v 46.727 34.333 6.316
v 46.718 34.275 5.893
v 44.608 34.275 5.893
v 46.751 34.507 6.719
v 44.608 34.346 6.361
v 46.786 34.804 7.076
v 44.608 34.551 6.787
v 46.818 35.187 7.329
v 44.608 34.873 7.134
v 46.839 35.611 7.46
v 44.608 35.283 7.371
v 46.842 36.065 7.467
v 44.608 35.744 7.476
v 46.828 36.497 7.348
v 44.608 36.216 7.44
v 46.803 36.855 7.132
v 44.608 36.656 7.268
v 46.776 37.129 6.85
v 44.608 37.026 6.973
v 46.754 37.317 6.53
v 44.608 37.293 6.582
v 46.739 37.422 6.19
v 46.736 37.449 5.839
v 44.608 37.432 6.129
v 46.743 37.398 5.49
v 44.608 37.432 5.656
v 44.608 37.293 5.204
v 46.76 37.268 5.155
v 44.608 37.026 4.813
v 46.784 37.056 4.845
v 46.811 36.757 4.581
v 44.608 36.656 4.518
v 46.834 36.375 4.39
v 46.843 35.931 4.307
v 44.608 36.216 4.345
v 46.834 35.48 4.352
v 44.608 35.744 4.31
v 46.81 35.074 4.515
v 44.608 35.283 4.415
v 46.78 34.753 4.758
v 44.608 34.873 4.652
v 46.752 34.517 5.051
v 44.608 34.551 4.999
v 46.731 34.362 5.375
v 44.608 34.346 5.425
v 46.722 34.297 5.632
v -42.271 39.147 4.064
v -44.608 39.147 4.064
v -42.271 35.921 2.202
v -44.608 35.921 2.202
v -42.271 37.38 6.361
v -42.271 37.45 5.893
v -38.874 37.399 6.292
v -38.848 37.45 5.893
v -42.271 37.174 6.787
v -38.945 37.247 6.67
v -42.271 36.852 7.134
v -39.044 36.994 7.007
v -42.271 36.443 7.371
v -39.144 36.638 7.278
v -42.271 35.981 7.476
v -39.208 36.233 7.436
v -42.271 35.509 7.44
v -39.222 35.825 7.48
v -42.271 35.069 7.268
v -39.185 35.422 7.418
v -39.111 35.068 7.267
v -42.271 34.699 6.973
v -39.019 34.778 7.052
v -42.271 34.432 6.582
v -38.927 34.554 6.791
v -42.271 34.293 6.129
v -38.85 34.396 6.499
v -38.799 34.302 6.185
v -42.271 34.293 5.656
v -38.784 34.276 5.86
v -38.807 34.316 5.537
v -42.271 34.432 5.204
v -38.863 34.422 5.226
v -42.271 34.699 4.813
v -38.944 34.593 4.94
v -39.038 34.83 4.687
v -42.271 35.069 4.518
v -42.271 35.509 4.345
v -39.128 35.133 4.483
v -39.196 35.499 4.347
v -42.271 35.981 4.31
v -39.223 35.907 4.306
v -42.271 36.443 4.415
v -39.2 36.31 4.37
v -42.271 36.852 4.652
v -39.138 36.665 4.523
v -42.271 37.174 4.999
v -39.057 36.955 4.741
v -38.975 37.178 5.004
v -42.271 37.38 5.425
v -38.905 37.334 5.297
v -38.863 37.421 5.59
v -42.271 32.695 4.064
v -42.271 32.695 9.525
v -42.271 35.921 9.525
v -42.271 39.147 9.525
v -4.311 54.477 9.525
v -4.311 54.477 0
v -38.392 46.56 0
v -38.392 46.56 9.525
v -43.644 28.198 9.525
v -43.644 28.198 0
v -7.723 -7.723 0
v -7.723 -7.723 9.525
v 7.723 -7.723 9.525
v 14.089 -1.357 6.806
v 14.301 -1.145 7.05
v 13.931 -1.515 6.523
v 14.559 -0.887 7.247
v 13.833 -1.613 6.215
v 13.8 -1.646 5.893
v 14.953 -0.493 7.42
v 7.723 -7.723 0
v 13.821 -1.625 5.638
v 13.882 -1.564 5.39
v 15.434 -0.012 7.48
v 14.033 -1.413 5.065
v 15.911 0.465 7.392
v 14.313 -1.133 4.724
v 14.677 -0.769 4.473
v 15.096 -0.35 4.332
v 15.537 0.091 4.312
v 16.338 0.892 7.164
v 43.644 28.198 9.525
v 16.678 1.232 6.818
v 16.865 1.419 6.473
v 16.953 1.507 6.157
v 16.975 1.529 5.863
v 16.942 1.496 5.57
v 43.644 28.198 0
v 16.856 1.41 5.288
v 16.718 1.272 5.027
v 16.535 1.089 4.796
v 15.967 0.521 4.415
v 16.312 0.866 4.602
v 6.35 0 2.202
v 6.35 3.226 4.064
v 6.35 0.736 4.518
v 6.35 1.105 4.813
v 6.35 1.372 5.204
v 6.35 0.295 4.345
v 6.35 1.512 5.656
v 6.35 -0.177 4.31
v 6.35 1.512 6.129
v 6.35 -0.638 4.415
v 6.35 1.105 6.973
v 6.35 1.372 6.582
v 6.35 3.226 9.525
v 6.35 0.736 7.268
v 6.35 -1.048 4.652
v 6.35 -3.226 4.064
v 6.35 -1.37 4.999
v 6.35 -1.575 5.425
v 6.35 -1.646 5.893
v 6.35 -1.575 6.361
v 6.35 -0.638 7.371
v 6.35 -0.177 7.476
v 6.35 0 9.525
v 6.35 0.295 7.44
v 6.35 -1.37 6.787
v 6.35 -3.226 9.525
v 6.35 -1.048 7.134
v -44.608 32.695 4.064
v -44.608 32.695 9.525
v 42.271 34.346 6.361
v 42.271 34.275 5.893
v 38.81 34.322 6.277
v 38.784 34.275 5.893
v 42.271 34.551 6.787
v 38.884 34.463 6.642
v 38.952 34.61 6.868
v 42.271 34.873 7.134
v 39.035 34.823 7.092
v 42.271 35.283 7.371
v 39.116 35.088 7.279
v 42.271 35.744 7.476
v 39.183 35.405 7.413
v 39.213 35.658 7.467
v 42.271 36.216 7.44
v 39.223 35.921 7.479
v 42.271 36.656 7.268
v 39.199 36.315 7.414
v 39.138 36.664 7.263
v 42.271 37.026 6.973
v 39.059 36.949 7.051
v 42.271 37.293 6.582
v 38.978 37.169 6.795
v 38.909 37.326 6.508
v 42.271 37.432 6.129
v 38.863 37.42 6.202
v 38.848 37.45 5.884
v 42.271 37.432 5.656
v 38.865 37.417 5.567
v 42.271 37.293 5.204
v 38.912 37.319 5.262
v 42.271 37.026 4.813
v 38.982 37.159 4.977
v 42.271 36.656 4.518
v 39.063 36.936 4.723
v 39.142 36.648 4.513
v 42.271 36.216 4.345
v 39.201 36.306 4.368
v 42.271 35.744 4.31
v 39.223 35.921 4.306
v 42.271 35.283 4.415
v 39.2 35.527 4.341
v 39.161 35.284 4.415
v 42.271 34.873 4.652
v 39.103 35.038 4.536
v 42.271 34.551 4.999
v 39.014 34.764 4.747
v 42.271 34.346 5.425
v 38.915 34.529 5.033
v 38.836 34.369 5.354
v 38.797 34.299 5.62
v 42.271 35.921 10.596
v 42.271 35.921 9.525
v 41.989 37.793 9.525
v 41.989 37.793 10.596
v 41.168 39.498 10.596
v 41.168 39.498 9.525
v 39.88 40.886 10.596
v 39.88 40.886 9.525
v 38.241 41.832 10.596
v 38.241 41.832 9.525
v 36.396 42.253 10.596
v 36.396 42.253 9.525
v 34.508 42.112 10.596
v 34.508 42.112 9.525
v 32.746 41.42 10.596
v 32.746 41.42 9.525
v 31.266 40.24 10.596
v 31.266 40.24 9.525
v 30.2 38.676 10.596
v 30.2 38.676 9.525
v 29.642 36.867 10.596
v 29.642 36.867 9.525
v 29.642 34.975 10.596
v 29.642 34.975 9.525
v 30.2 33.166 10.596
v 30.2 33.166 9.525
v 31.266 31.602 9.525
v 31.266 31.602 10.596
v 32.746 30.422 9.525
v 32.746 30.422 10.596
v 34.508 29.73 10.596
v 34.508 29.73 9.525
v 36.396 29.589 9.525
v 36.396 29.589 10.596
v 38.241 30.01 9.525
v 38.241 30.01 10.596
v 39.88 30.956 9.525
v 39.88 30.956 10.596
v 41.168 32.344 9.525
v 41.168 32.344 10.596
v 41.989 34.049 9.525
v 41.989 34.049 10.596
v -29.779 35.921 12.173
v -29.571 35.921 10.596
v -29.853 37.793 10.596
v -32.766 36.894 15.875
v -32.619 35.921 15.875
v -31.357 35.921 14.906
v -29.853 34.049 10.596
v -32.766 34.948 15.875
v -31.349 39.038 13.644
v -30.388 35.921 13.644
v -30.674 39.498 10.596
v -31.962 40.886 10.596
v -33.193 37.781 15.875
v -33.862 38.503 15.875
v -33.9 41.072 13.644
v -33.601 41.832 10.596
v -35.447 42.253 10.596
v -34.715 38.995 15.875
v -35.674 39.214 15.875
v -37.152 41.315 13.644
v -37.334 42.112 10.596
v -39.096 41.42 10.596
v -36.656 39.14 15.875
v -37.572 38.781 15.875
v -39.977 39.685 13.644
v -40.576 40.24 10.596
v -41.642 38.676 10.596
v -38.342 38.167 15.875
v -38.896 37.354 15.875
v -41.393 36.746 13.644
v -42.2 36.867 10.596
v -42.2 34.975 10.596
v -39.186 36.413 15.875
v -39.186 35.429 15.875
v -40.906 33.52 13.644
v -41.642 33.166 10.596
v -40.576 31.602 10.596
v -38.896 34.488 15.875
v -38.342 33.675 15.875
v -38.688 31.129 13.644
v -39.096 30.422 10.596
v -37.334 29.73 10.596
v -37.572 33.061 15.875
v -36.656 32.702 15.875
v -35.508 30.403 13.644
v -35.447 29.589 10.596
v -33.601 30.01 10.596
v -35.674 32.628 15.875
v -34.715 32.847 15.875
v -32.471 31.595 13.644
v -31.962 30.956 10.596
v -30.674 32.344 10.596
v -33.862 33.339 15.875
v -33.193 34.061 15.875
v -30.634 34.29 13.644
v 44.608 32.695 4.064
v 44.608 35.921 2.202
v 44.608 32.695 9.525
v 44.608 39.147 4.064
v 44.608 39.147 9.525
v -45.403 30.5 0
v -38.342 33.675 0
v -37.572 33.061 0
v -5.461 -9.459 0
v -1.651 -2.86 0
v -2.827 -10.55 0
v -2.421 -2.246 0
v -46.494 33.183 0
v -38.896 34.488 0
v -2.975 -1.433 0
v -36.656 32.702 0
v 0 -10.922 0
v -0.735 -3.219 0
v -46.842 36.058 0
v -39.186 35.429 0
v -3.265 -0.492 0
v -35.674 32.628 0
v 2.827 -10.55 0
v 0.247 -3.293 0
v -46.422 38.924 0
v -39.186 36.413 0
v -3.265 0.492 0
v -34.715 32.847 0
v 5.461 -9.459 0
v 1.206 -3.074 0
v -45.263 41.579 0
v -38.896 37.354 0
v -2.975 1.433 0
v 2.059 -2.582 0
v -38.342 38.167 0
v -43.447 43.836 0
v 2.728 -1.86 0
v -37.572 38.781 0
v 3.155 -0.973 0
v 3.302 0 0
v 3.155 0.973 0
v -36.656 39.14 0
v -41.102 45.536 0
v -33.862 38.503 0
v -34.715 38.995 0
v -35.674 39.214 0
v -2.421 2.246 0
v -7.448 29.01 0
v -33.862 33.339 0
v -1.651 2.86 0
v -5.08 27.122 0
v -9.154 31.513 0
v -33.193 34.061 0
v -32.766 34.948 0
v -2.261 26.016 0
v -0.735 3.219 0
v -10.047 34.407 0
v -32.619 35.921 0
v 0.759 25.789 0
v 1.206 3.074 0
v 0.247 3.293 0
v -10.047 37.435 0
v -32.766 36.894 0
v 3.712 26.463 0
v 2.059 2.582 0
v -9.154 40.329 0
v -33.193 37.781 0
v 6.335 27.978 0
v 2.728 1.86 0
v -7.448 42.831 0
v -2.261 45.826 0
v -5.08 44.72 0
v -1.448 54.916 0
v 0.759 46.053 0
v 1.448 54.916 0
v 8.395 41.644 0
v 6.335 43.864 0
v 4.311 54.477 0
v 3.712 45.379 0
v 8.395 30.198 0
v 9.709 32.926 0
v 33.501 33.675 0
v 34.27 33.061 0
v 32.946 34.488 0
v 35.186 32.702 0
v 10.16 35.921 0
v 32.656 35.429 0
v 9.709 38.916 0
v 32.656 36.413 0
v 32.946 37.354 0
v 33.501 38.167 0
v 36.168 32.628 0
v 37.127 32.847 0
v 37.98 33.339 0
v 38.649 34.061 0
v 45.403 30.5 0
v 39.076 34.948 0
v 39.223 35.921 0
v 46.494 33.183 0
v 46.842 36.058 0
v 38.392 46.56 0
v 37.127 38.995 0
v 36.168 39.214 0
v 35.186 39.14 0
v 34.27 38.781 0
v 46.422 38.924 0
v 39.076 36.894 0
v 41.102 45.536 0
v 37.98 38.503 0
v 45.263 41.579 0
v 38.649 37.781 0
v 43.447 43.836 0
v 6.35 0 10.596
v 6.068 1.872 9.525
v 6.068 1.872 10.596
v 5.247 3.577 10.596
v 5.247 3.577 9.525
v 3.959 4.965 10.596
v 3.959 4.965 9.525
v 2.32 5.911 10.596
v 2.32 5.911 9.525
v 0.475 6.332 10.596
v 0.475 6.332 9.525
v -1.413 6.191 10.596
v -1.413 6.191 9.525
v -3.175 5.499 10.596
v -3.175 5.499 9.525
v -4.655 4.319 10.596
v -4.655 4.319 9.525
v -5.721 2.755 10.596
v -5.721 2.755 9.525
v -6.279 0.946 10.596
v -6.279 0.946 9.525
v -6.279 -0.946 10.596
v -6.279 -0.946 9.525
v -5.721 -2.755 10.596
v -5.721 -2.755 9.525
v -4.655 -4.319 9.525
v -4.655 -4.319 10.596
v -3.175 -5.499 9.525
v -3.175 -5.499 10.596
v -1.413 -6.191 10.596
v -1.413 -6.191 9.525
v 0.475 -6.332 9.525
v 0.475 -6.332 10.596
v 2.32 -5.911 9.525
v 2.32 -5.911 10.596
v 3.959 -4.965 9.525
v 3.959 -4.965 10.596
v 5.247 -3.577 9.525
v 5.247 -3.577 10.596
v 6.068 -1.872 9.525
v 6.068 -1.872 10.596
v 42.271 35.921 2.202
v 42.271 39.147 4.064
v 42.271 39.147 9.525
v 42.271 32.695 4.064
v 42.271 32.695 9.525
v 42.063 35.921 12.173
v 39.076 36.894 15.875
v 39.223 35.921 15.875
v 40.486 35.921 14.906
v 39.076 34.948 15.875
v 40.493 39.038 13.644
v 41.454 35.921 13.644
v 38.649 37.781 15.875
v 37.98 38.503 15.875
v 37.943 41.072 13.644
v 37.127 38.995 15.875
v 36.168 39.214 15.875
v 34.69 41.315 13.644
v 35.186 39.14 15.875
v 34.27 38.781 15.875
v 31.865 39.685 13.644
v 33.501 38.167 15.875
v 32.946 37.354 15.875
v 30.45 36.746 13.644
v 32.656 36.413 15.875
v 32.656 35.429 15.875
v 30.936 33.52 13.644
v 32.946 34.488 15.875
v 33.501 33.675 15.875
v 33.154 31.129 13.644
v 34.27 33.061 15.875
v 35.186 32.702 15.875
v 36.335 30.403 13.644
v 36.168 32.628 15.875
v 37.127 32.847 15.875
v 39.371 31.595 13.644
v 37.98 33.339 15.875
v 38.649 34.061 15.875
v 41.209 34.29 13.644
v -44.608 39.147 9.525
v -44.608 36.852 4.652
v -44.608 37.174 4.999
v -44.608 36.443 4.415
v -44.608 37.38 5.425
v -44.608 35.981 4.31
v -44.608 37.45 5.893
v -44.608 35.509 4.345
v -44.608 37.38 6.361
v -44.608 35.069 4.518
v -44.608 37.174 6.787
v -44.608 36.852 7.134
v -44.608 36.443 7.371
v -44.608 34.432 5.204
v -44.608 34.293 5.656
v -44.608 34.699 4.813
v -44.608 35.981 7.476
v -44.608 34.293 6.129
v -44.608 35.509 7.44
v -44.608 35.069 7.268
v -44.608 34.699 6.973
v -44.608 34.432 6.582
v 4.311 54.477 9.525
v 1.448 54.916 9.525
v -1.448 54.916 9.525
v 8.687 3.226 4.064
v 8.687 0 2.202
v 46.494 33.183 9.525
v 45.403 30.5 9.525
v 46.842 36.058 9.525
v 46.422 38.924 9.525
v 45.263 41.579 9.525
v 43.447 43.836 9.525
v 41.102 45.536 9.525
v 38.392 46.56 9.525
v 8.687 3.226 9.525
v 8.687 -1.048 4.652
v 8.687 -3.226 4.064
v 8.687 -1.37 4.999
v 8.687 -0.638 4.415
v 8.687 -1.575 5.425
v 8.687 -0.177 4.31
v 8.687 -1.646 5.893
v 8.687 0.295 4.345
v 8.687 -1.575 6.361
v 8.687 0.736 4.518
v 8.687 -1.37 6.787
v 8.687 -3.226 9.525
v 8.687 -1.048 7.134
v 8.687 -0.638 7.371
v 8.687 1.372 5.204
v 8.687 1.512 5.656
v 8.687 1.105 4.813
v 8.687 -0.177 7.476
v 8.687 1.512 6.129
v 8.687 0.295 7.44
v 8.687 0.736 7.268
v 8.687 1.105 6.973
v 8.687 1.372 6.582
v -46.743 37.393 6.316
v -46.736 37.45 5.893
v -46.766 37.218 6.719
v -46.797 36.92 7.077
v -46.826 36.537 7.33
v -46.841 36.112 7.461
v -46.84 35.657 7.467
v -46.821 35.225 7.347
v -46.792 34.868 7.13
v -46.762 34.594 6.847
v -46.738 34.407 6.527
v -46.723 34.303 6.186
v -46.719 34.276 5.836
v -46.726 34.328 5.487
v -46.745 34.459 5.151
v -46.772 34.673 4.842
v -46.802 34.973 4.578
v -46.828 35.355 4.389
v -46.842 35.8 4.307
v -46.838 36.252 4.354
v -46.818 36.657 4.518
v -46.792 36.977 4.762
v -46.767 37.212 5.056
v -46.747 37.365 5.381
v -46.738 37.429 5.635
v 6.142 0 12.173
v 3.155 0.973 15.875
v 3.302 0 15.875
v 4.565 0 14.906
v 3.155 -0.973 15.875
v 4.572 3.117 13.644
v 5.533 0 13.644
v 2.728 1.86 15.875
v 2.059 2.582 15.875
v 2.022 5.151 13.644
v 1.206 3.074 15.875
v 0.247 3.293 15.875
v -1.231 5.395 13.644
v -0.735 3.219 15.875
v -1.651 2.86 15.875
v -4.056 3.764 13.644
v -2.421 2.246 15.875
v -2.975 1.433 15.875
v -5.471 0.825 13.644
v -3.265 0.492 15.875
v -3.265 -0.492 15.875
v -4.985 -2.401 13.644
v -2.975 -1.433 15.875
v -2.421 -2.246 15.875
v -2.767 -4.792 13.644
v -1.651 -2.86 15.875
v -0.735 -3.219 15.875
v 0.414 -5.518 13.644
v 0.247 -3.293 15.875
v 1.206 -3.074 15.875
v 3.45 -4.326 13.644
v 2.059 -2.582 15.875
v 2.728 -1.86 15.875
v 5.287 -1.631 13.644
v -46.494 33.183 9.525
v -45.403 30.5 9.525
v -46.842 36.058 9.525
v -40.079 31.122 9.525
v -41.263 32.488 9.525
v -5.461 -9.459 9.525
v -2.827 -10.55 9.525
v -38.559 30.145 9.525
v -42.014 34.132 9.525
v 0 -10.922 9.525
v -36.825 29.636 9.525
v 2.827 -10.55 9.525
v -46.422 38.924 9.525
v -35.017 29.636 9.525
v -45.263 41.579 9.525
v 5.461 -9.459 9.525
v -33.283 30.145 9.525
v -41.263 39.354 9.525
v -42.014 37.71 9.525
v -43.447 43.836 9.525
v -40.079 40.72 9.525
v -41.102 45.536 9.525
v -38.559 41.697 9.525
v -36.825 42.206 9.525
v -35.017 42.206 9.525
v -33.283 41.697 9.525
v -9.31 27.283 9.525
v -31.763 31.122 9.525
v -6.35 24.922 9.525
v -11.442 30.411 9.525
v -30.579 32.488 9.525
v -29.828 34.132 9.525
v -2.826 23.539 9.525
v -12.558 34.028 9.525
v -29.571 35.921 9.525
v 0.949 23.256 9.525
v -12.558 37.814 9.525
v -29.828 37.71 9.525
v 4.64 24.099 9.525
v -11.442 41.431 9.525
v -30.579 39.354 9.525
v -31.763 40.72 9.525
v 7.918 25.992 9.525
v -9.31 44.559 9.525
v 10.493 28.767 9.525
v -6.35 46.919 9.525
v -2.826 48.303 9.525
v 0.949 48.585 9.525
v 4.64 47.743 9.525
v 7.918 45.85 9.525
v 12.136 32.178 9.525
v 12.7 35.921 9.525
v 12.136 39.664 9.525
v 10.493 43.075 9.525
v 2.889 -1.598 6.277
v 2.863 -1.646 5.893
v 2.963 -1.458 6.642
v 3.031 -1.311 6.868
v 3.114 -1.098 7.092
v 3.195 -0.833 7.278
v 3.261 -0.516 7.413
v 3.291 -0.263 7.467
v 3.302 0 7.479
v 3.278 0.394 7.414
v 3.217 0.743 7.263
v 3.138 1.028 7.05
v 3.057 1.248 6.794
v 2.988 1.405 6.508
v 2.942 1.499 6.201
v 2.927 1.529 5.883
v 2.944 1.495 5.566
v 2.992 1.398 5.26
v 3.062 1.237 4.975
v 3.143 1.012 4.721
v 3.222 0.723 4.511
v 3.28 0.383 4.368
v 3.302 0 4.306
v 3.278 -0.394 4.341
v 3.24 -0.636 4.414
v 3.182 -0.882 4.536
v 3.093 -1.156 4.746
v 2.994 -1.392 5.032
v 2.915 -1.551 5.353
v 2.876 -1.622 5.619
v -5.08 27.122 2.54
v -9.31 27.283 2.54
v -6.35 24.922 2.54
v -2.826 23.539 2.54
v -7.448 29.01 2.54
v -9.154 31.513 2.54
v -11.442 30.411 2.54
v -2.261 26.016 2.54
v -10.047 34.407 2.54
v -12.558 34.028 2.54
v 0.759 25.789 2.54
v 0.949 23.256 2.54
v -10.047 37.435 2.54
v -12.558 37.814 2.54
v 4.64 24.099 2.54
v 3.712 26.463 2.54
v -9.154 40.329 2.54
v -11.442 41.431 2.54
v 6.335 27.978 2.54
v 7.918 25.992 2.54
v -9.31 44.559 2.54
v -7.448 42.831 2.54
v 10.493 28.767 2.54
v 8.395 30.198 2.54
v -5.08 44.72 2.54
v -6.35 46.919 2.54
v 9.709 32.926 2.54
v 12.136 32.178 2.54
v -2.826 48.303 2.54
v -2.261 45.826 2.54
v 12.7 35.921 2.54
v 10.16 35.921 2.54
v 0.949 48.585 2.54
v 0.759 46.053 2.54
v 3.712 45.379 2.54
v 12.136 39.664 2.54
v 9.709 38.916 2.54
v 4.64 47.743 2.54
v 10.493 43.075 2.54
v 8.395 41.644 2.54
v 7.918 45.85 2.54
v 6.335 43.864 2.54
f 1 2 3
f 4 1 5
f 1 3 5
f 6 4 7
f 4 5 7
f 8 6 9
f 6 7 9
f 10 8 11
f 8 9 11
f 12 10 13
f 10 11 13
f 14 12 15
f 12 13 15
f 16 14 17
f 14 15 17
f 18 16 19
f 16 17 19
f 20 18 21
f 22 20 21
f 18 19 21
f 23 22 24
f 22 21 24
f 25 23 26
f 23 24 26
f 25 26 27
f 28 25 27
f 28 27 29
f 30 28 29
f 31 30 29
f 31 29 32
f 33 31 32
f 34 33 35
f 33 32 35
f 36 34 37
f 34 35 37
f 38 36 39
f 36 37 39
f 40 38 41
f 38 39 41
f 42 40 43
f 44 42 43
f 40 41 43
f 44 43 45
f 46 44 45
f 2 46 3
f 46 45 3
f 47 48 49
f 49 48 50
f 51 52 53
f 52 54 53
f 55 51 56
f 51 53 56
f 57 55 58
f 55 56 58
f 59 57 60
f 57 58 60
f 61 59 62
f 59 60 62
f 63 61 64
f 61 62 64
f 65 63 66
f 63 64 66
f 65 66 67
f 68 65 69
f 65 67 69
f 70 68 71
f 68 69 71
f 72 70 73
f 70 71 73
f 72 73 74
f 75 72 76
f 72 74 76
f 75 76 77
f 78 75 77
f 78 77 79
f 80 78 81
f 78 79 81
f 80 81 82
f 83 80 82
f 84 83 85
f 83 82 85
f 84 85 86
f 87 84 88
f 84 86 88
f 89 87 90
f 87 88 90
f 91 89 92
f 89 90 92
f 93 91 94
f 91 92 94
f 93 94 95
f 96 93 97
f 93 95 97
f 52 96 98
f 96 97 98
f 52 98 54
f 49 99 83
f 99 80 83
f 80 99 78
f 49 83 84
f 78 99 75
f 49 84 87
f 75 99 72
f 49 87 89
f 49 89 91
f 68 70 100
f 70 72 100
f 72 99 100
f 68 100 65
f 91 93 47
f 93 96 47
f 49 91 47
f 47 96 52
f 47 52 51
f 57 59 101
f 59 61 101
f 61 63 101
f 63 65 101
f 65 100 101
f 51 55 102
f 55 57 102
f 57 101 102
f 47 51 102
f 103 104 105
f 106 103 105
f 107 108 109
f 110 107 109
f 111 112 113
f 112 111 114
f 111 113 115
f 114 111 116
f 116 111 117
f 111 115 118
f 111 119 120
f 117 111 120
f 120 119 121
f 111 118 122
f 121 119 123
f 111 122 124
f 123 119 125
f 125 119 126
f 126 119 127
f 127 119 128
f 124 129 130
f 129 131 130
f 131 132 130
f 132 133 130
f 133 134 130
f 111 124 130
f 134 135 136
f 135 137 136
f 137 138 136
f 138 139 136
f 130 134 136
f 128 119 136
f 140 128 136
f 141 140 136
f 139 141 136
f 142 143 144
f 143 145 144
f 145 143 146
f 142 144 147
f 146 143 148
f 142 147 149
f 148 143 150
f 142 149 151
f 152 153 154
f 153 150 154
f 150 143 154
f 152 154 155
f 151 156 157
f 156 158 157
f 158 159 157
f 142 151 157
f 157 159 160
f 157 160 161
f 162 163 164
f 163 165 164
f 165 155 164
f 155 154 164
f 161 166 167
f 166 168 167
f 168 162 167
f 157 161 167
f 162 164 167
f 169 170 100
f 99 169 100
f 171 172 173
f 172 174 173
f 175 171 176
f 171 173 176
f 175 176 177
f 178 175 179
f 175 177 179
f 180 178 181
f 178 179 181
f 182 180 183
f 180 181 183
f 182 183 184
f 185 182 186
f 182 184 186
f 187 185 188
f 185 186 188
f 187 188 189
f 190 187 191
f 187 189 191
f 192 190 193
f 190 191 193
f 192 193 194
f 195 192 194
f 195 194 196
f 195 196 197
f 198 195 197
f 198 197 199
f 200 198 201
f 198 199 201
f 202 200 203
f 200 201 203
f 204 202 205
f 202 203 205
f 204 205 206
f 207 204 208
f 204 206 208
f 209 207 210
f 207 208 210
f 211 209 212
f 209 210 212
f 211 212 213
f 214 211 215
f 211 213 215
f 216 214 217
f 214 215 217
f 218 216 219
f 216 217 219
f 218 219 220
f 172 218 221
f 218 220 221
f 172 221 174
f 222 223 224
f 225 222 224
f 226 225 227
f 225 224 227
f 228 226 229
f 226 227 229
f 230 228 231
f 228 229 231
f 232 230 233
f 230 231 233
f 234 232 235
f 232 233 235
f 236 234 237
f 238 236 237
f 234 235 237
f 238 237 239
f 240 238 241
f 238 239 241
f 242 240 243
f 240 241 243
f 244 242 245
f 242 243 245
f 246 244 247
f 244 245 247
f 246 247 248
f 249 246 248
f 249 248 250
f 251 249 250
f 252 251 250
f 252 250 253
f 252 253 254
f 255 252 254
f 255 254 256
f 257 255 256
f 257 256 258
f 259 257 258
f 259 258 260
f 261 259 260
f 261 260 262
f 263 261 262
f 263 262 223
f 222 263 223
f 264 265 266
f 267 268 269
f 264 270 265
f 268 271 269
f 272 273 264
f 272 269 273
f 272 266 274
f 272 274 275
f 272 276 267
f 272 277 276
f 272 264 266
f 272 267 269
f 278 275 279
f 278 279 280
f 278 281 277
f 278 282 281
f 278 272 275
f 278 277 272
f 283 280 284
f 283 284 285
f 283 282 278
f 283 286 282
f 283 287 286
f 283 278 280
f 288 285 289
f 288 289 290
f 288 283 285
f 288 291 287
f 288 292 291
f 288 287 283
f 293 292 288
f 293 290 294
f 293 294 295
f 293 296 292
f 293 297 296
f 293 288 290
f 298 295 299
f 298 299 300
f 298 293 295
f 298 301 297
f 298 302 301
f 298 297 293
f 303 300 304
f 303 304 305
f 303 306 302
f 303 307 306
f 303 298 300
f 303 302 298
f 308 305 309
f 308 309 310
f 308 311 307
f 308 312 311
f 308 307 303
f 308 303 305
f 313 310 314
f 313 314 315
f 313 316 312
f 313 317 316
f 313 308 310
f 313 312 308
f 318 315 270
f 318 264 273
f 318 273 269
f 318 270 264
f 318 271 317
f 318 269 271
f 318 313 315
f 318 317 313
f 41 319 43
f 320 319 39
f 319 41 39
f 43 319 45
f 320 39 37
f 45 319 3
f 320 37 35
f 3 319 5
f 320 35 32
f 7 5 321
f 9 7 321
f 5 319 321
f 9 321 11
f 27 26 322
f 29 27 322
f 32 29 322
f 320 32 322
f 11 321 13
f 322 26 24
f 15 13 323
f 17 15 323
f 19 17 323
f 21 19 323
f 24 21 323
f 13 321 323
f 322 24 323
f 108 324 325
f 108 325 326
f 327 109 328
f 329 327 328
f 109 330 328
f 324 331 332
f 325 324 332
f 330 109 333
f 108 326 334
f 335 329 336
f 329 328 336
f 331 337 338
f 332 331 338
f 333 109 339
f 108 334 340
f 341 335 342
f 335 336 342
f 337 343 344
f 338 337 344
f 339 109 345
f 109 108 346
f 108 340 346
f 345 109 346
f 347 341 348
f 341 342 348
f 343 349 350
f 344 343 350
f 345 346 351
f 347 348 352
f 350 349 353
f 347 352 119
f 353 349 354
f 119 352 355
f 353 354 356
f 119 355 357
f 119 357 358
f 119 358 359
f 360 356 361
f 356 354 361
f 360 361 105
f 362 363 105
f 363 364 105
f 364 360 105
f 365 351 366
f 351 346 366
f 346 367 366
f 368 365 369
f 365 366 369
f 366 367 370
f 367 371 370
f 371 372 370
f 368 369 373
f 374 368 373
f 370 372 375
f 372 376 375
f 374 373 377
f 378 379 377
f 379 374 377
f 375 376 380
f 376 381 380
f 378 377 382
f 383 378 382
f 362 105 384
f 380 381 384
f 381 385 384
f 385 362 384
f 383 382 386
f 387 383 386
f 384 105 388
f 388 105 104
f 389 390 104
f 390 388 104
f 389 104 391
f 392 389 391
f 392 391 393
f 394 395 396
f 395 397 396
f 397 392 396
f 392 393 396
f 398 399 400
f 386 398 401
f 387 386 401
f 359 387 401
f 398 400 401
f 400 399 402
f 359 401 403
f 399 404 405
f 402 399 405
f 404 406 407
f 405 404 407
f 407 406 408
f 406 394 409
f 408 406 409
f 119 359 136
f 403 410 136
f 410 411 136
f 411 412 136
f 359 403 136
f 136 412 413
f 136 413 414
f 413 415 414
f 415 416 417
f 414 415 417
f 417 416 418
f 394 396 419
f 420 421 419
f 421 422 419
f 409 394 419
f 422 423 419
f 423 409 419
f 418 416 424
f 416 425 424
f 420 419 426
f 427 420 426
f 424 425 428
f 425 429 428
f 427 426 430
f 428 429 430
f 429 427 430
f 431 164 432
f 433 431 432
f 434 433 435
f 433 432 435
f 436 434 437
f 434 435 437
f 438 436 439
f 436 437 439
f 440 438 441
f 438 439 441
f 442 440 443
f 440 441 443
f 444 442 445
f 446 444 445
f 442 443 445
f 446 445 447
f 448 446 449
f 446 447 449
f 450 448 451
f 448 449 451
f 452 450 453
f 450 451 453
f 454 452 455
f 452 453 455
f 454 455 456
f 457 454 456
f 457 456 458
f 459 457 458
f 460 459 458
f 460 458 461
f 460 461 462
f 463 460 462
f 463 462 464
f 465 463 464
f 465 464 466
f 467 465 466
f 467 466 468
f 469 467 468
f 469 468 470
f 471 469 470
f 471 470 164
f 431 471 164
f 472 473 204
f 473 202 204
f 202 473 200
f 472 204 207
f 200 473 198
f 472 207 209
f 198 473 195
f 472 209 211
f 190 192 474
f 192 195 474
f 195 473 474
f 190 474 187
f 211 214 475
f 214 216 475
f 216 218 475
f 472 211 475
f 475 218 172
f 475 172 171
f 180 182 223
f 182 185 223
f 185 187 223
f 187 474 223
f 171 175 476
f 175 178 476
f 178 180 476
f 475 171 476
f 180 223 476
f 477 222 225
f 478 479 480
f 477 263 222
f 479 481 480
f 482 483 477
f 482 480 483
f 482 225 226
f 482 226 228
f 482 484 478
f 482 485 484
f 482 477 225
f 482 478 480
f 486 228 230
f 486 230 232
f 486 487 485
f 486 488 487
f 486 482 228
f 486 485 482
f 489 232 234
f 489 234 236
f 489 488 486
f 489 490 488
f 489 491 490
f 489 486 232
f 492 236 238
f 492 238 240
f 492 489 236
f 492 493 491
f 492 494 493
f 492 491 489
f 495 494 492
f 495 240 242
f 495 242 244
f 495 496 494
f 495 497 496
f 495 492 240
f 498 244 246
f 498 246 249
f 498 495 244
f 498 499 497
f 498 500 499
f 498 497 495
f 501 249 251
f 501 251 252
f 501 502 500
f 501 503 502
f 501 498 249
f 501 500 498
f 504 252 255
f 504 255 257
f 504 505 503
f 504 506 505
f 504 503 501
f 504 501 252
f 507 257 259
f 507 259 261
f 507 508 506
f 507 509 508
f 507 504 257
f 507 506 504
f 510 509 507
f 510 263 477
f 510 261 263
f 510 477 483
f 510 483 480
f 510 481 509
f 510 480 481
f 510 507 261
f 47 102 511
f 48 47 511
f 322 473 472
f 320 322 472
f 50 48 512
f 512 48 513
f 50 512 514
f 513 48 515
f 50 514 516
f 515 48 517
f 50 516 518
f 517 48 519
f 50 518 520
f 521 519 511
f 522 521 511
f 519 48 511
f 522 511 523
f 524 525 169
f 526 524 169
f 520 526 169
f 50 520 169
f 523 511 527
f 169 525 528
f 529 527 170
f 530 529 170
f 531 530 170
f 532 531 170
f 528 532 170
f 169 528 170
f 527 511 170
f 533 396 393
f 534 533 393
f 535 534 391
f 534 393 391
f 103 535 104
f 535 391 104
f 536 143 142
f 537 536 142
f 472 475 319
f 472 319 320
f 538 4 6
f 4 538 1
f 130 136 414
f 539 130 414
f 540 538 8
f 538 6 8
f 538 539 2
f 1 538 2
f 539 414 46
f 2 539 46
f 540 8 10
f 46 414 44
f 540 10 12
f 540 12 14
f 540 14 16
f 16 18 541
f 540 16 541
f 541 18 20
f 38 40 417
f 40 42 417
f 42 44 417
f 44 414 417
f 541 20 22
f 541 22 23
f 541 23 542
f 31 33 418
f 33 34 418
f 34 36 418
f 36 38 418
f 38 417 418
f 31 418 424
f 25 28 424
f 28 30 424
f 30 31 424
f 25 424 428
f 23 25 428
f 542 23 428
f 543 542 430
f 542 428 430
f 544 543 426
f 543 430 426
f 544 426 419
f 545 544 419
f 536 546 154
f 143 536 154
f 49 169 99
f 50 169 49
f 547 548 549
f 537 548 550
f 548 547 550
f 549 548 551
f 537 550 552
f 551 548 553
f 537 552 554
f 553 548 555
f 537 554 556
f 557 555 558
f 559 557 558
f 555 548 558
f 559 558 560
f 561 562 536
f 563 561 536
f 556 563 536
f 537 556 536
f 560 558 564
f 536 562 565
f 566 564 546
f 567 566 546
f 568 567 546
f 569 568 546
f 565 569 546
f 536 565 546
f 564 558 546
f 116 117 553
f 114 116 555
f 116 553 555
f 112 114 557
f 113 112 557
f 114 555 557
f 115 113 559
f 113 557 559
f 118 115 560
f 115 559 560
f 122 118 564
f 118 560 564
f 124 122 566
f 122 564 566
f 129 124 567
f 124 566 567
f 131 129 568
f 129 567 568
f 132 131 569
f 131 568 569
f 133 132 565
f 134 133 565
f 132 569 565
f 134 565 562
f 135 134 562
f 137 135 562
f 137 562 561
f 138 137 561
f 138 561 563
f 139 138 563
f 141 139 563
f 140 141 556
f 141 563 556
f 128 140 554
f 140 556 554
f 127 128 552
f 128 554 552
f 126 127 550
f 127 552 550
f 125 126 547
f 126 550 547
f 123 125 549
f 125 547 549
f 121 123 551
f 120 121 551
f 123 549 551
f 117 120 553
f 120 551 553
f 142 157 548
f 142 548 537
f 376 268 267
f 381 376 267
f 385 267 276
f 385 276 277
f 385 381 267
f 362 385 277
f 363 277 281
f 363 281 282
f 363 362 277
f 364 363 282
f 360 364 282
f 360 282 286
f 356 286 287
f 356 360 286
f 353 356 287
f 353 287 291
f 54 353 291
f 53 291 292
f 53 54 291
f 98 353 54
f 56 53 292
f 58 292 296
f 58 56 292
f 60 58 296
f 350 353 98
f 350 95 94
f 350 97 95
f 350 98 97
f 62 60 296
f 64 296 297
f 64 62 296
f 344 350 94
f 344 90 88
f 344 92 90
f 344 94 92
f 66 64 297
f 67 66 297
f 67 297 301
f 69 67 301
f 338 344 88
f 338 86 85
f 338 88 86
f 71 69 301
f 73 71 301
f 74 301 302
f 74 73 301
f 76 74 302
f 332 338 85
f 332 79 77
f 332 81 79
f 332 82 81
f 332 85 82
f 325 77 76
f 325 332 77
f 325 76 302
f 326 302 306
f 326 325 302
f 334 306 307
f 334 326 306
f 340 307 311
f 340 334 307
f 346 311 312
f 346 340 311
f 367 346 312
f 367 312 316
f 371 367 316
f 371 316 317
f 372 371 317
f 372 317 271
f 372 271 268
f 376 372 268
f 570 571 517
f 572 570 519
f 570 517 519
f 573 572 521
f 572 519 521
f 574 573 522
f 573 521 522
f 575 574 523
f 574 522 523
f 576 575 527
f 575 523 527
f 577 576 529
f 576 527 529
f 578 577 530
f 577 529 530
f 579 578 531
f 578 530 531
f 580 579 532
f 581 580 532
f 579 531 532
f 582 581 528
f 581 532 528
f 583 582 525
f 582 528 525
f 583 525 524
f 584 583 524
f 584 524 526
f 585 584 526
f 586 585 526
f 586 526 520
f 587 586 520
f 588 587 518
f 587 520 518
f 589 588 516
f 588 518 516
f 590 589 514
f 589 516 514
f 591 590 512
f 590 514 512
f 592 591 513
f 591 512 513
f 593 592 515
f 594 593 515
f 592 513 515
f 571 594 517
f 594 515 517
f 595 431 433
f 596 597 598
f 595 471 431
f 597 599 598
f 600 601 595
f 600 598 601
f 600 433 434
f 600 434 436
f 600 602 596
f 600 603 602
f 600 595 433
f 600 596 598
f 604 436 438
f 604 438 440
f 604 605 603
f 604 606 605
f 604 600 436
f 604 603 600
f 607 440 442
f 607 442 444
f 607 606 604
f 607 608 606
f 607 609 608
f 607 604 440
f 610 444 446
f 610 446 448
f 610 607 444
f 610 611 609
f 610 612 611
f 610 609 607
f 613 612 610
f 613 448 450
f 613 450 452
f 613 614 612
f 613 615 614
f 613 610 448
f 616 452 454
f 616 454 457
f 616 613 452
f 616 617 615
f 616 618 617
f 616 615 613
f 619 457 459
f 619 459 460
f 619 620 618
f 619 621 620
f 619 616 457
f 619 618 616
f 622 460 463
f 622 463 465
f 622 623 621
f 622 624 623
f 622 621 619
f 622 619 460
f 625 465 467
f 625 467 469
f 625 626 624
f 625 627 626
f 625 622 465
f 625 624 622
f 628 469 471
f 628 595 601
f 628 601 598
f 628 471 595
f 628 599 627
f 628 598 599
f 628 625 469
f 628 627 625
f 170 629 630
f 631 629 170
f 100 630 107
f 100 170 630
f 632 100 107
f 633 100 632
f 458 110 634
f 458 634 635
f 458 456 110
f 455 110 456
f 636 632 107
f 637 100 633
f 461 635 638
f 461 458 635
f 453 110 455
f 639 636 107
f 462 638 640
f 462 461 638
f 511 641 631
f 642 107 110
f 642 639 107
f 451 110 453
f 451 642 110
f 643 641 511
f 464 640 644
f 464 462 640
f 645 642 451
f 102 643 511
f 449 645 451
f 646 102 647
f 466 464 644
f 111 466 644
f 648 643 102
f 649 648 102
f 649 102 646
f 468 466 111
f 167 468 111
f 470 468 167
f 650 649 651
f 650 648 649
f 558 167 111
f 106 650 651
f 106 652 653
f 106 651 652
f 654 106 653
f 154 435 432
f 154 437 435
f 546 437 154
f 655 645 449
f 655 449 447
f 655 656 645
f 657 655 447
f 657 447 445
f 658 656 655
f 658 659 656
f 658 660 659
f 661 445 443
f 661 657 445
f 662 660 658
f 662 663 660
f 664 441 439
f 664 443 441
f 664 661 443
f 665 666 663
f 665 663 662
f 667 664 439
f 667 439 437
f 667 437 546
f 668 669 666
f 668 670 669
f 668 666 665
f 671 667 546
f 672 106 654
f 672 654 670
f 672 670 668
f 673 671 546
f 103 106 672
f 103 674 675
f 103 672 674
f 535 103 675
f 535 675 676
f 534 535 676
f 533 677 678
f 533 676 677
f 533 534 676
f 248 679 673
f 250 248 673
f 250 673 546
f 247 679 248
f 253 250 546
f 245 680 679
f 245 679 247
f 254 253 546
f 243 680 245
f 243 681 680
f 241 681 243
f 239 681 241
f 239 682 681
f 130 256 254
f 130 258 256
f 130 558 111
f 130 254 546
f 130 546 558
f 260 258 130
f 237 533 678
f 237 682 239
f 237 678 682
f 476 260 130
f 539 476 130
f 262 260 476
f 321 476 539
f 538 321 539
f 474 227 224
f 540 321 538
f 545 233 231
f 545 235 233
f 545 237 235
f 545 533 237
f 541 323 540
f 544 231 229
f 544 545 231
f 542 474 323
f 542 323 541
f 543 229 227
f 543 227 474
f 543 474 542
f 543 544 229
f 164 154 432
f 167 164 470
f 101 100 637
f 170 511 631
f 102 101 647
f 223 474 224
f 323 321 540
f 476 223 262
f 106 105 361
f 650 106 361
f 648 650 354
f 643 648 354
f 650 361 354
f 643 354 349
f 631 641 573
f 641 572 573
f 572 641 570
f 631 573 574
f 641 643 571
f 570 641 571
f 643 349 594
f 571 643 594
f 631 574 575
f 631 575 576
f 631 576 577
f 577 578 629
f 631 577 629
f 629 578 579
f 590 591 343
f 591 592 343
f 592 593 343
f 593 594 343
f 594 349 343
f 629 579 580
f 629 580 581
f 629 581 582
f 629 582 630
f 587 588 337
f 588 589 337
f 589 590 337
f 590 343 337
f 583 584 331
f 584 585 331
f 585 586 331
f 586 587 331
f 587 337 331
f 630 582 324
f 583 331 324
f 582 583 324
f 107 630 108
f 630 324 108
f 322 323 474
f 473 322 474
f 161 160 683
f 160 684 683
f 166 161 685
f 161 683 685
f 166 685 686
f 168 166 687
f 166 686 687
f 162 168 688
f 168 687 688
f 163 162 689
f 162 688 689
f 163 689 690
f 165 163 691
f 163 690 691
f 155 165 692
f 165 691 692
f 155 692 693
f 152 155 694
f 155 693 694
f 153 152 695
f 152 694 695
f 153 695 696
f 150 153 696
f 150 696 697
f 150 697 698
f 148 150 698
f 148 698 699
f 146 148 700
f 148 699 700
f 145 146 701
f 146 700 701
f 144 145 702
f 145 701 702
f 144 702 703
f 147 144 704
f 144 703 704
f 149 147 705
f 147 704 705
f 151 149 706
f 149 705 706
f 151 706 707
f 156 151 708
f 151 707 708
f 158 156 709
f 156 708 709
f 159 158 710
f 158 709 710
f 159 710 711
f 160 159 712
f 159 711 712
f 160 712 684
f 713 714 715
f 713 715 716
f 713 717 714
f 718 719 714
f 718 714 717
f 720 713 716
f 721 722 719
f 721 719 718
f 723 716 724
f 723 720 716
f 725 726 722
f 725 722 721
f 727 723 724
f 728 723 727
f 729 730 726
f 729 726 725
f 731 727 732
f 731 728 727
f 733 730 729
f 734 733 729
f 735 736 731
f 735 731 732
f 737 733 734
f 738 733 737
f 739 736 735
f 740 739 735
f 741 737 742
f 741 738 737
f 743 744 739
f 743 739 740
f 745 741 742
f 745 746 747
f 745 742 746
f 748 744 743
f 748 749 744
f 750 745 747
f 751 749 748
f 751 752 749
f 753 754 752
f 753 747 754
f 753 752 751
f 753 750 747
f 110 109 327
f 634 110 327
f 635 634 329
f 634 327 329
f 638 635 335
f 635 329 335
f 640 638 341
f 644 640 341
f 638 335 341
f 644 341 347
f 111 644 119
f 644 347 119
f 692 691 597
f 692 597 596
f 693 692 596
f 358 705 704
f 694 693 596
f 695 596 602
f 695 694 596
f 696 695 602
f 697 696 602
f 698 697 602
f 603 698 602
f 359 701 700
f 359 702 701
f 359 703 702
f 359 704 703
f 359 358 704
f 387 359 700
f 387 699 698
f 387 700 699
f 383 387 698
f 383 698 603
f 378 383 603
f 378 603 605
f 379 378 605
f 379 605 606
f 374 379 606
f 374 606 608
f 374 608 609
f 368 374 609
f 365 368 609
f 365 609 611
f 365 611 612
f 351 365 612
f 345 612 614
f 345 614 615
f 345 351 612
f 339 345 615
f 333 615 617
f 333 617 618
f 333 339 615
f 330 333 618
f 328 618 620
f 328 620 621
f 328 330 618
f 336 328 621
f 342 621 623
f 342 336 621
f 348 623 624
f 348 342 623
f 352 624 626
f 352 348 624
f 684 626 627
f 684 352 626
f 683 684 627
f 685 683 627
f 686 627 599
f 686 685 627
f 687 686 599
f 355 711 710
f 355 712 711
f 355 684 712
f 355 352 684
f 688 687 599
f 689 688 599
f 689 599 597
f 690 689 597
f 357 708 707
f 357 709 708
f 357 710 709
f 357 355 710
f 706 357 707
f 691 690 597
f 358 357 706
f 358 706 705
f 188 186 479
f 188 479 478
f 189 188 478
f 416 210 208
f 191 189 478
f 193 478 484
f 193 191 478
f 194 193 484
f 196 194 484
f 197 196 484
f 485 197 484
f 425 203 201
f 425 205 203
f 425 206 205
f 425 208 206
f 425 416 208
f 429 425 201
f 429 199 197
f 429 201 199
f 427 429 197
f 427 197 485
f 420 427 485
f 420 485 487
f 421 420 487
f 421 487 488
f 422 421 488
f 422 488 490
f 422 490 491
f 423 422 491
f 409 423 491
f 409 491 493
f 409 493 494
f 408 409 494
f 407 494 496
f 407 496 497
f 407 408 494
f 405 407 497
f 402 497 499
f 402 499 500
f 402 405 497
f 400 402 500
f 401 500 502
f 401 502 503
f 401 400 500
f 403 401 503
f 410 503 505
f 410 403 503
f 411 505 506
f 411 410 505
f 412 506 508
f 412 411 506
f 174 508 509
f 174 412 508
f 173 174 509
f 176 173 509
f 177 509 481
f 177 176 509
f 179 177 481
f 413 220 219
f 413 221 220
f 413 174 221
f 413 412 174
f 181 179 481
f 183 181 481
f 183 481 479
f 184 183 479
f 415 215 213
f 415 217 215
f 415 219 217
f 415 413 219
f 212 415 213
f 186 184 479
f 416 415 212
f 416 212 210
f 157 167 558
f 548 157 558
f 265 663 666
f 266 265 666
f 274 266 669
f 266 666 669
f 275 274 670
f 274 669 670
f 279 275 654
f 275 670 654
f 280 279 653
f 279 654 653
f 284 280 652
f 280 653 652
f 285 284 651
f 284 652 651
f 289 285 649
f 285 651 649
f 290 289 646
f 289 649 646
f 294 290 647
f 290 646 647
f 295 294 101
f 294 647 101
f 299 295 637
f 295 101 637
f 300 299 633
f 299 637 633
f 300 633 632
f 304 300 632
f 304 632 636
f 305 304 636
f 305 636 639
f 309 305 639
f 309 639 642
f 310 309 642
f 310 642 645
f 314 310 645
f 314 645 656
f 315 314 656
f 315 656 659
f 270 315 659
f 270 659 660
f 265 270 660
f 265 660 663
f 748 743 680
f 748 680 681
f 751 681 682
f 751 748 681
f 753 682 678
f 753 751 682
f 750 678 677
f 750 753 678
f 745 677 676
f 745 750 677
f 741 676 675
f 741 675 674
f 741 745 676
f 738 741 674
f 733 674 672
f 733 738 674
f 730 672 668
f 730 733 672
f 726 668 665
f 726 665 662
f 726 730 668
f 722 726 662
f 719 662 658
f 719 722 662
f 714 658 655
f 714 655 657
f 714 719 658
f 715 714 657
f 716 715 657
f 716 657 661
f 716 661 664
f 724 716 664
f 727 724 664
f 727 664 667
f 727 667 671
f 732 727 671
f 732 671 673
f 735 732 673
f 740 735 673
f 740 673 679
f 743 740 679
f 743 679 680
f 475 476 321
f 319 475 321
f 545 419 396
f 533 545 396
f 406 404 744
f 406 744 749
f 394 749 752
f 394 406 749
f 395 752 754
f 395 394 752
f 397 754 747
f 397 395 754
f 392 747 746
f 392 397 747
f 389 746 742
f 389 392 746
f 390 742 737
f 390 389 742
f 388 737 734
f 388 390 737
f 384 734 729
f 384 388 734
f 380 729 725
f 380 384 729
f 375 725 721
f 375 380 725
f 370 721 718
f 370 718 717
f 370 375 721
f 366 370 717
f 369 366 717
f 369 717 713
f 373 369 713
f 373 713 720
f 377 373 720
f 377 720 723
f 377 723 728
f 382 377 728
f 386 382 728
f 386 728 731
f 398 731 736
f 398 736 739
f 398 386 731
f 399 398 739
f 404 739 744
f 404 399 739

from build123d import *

# Parameters (mm, degrees)
F0_R        = 3.302
F0_R_2      = 12.7
F1_DEPTH    = 9.525
F0_R_3      = 10.16
F2_DEPTH    = 2.54
F5_DEPTH    = 8.636
F6_T1_DEPTH = 2.3368
F6_T3_DEPTH = 2.3368
F6_T5_DEPTH = 2.3368
F3_R        = 6.35
F3_R_2      = 3.302
F7_DEPTH    = 6.35
F11_R       = 1.5875
F12_DEPTH   = 6.35
F9_R        = 1.5875
F13_DEPTH   = 6.35
F10_R       = 1.5875
F14_DEPTH   = 8.382


# Not quite as in the source:
# - a fillet or chamfer that OpenCascade refuses, or shapes differently, is made with other operations: its cross-section is extruded or revolved along the edge and cut away or added
# - a feature names something its author has since deleted; it is built from what else it names


with BuildPart() as f1:
    # F0 (on Top) → F1 (new body)
    with BuildSketch(Plane.XY):
        with BuildLine():
            Line((38.3924752276, 46.5596586637), (4.3105120801, 54.476849111))
            ThreePointArc((4.3105120801, 54.476849111), (0, 54.970934), (-4.3105120801, 54.476849111))
            Line((-4.3105120801, 54.476849111), (-38.3924752276, 46.5596586637))
            ThreePointArc((-38.3924752276, 46.5596586637), (-46.4220600308, 38.9243049052), (-43.6441157783, 28.1978942818))
            Line((-43.6441157783, 28.1978942818), (-7.72300081, -7.7230397182))
            ThreePointArc((-7.72300081, -7.7230397182), (0, -10.922), (7.72300081, -7.7230397182))
            Line((7.72300081, -7.7230397182), (43.6441157783, 28.1978942818))
            ThreePointArc((43.6441157783, 28.1978942818), (46.4220600308, 38.9243049052), (38.3924752276, 46.5596586637))
        make_face()
        Circle(F0_R, mode=Mode.SUBTRACT)
        with Locations((-35.9211149683, 35.920934)):
            Circle(F0_R, mode=Mode.SUBTRACT)
        with Locations((0, 35.920934)):
            Circle(F0_R_2, mode=Mode.SUBTRACT)
        with Locations((35.9211149683, 35.920934)):
            Circle(F0_R, mode=Mode.SUBTRACT)
    extrude(amount=F1_DEPTH)

    # F0 (on Top) → F2 (join)
    with BuildSketch(Plane.XY):
        with Locations((0, 35.920934)):
            Circle(F0_R_2)
        with Locations((0, 35.920934)):
            Circle(F0_R_3, mode=Mode.SUBTRACT)
    extrude(amount=F2_DEPTH)

    # F4 (on face) → F5 (cut)
    with BuildSketch(Plane.XY.offset(9.525)):
        Polygon((-42.2711149683, 32.695134), (-42.2711149683, 35.920934), (-42.2711149683, 39.146734), (-44.6079149683, 39.146734), (-44.6079149683, 32.695134), align=None)
        Polygon((42.2711149683, 39.146734), (42.2711149683, 35.920934), (42.2711149683, 32.695134), (44.6079149683, 32.695134), (44.6079149683, 39.146734), align=None)
        Polygon((6.35, 3.2258), (6.35, 0), (6.35, -3.2258), (8.6868, -3.2258), (8.6868, 3.2258), align=None)
    extrude(amount=-F5_DEPTH, mode=Mode.SUBTRACT)

    # F6: chamfer of 3.175 x 5.499261314 on 6 edges, made by hand

    # F6_s2 → F6_t1 (join)
    with BuildSketch(Plane.YZ.offset(-44.6079149683)):
        Polygon((39.146734, 4.064), (33.647472686, 0.889), (39.146734, 0.889), align=None)
        Polygon((32.695134, 4.064), (38.194395314, 0.889), (32.695134, 0.889), align=None)
    extrude(amount=F6_T1_DEPTH)

    # F6_s4 → F6_t3 (join)
    with BuildSketch(Plane.YZ.offset(6.35)):
        Polygon((3.2258, 4.064), (-2.273461314, 0.889), (3.2258, 0.889), align=None)
        Polygon((-3.2258, 4.064), (2.273461314, 0.889), (-3.2258, 0.889), align=None)
    extrude(amount=F6_T3_DEPTH)

    # F6_s6 → F6_t5 (join)
    with BuildSketch(Plane.YZ.offset(42.2711149683)):
        Polygon((39.146734, 4.064), (33.647472686, 0.889), (39.146734, 0.889), align=None)
        Polygon((32.695134, 4.064), (38.194395314, 0.889), (32.695134, 0.889), align=None)
    extrude(amount=F6_T5_DEPTH)

    # F3 (on face) → F7 (join)
    with BuildSketch(Plane.XY.offset(9.525)):
        with Locations((-35.9211149683, 35.920934)):
            Circle(F3_R)
        with Locations((-35.9211149683, 35.920934)):
            Circle(F3_R_2, mode=Mode.SUBTRACT)
        Circle(F3_R)
        Circle(F3_R_2, mode=Mode.SUBTRACT)
        with Locations((35.9211149683, 35.920934)):
            Circle(F3_R)
        with Locations((35.9211149683, 35.920934)):
            Circle(F3_R_2, mode=Mode.SUBTRACT)
    extrude(amount=F7_DEPTH)

    # F8: fillet of radius 6.096 on 3 edges, made by hand

    # F8_s1 → F8_t2 (revolve, cut)
    with BuildSketch(Plane.XZ.offset(-35.920934)):
        with BuildLine():
            ThreePointArc((-29.5711149683, 10.5957091385), (-30.3878241069, 13.6437091385), (-32.6191149683, 15.875))
            Line((-32.6191149683, 15.875), (-29.5711149683, 15.875))
            Line((-29.5711149683, 15.875), (-29.5711149683, 10.5957091385))
        make_face()
    revolve(axis=Axis((-35.9211149683, 35.920934, 15.875), (0, 0, 1)), mode=Mode.SUBTRACT)

    # F8_s3 → F8_t4 (revolve, cut)
    with BuildSketch(Plane.XZ.offset(-35.920934)):
        with BuildLine():
            ThreePointArc((42.2711149683, 10.5957091385), (41.4544058298, 13.6437091385), (39.2231149683, 15.875))
            Line((39.2231149683, 15.875), (42.2711149683, 15.875))
            Line((42.2711149683, 15.875), (42.2711149683, 10.5957091385))
        make_face()
    revolve(axis=Axis((35.9211149683, 35.920934, 15.875), (0, 0, 1)), mode=Mode.SUBTRACT)

    # F8_s5 → F8_t6 (revolve, cut)
    with BuildSketch(Plane.XZ):
        with BuildLine():
            ThreePointArc((6.35, 10.5957091385), (5.5332908615, 13.6437091385), (3.302, 15.875))
            Line((3.302, 15.875), (6.35, 15.875))
            Line((6.35, 15.875), (6.35, 10.5957091385))
        make_face()
    revolve(axis=Axis((0, 0, 15.875), (0, 0, 1)), mode=Mode.SUBTRACT)

    # F11 (on face) → F12 (cut, symmetric)
    with BuildSketch(Plane(origin=(44.6079149683, 0, 0), x_dir=(0, -1, 0), z_dir=(-1, 0, 0))):
        with Locations((-35.8627085169, 5.8928)):
            Circle(F11_R)
    extrude(amount=F12_DEPTH, both=True, mode=Mode.SUBTRACT)

    # F9 (on face) → F13 (cut, symmetric)
    with BuildSketch(Plane.YZ.offset(-44.6079149683)):
        with Locations((35.8627085169, 5.8928)):
            Circle(F9_R)
    extrude(amount=F13_DEPTH, both=True, mode=Mode.SUBTRACT)

    # F10 (on face) → F14 (cut, symmetric)
    with BuildSketch(Plane(origin=(8.6868, 0, 0), x_dir=(0, -1, 0), z_dir=(-1, 0, 0))):
        with Locations((0.0582254831, 5.8928)):
            Circle(F10_R)
    extrude(amount=F14_DEPTH, both=True, mode=Mode.SUBTRACT)


solid = f1.part
